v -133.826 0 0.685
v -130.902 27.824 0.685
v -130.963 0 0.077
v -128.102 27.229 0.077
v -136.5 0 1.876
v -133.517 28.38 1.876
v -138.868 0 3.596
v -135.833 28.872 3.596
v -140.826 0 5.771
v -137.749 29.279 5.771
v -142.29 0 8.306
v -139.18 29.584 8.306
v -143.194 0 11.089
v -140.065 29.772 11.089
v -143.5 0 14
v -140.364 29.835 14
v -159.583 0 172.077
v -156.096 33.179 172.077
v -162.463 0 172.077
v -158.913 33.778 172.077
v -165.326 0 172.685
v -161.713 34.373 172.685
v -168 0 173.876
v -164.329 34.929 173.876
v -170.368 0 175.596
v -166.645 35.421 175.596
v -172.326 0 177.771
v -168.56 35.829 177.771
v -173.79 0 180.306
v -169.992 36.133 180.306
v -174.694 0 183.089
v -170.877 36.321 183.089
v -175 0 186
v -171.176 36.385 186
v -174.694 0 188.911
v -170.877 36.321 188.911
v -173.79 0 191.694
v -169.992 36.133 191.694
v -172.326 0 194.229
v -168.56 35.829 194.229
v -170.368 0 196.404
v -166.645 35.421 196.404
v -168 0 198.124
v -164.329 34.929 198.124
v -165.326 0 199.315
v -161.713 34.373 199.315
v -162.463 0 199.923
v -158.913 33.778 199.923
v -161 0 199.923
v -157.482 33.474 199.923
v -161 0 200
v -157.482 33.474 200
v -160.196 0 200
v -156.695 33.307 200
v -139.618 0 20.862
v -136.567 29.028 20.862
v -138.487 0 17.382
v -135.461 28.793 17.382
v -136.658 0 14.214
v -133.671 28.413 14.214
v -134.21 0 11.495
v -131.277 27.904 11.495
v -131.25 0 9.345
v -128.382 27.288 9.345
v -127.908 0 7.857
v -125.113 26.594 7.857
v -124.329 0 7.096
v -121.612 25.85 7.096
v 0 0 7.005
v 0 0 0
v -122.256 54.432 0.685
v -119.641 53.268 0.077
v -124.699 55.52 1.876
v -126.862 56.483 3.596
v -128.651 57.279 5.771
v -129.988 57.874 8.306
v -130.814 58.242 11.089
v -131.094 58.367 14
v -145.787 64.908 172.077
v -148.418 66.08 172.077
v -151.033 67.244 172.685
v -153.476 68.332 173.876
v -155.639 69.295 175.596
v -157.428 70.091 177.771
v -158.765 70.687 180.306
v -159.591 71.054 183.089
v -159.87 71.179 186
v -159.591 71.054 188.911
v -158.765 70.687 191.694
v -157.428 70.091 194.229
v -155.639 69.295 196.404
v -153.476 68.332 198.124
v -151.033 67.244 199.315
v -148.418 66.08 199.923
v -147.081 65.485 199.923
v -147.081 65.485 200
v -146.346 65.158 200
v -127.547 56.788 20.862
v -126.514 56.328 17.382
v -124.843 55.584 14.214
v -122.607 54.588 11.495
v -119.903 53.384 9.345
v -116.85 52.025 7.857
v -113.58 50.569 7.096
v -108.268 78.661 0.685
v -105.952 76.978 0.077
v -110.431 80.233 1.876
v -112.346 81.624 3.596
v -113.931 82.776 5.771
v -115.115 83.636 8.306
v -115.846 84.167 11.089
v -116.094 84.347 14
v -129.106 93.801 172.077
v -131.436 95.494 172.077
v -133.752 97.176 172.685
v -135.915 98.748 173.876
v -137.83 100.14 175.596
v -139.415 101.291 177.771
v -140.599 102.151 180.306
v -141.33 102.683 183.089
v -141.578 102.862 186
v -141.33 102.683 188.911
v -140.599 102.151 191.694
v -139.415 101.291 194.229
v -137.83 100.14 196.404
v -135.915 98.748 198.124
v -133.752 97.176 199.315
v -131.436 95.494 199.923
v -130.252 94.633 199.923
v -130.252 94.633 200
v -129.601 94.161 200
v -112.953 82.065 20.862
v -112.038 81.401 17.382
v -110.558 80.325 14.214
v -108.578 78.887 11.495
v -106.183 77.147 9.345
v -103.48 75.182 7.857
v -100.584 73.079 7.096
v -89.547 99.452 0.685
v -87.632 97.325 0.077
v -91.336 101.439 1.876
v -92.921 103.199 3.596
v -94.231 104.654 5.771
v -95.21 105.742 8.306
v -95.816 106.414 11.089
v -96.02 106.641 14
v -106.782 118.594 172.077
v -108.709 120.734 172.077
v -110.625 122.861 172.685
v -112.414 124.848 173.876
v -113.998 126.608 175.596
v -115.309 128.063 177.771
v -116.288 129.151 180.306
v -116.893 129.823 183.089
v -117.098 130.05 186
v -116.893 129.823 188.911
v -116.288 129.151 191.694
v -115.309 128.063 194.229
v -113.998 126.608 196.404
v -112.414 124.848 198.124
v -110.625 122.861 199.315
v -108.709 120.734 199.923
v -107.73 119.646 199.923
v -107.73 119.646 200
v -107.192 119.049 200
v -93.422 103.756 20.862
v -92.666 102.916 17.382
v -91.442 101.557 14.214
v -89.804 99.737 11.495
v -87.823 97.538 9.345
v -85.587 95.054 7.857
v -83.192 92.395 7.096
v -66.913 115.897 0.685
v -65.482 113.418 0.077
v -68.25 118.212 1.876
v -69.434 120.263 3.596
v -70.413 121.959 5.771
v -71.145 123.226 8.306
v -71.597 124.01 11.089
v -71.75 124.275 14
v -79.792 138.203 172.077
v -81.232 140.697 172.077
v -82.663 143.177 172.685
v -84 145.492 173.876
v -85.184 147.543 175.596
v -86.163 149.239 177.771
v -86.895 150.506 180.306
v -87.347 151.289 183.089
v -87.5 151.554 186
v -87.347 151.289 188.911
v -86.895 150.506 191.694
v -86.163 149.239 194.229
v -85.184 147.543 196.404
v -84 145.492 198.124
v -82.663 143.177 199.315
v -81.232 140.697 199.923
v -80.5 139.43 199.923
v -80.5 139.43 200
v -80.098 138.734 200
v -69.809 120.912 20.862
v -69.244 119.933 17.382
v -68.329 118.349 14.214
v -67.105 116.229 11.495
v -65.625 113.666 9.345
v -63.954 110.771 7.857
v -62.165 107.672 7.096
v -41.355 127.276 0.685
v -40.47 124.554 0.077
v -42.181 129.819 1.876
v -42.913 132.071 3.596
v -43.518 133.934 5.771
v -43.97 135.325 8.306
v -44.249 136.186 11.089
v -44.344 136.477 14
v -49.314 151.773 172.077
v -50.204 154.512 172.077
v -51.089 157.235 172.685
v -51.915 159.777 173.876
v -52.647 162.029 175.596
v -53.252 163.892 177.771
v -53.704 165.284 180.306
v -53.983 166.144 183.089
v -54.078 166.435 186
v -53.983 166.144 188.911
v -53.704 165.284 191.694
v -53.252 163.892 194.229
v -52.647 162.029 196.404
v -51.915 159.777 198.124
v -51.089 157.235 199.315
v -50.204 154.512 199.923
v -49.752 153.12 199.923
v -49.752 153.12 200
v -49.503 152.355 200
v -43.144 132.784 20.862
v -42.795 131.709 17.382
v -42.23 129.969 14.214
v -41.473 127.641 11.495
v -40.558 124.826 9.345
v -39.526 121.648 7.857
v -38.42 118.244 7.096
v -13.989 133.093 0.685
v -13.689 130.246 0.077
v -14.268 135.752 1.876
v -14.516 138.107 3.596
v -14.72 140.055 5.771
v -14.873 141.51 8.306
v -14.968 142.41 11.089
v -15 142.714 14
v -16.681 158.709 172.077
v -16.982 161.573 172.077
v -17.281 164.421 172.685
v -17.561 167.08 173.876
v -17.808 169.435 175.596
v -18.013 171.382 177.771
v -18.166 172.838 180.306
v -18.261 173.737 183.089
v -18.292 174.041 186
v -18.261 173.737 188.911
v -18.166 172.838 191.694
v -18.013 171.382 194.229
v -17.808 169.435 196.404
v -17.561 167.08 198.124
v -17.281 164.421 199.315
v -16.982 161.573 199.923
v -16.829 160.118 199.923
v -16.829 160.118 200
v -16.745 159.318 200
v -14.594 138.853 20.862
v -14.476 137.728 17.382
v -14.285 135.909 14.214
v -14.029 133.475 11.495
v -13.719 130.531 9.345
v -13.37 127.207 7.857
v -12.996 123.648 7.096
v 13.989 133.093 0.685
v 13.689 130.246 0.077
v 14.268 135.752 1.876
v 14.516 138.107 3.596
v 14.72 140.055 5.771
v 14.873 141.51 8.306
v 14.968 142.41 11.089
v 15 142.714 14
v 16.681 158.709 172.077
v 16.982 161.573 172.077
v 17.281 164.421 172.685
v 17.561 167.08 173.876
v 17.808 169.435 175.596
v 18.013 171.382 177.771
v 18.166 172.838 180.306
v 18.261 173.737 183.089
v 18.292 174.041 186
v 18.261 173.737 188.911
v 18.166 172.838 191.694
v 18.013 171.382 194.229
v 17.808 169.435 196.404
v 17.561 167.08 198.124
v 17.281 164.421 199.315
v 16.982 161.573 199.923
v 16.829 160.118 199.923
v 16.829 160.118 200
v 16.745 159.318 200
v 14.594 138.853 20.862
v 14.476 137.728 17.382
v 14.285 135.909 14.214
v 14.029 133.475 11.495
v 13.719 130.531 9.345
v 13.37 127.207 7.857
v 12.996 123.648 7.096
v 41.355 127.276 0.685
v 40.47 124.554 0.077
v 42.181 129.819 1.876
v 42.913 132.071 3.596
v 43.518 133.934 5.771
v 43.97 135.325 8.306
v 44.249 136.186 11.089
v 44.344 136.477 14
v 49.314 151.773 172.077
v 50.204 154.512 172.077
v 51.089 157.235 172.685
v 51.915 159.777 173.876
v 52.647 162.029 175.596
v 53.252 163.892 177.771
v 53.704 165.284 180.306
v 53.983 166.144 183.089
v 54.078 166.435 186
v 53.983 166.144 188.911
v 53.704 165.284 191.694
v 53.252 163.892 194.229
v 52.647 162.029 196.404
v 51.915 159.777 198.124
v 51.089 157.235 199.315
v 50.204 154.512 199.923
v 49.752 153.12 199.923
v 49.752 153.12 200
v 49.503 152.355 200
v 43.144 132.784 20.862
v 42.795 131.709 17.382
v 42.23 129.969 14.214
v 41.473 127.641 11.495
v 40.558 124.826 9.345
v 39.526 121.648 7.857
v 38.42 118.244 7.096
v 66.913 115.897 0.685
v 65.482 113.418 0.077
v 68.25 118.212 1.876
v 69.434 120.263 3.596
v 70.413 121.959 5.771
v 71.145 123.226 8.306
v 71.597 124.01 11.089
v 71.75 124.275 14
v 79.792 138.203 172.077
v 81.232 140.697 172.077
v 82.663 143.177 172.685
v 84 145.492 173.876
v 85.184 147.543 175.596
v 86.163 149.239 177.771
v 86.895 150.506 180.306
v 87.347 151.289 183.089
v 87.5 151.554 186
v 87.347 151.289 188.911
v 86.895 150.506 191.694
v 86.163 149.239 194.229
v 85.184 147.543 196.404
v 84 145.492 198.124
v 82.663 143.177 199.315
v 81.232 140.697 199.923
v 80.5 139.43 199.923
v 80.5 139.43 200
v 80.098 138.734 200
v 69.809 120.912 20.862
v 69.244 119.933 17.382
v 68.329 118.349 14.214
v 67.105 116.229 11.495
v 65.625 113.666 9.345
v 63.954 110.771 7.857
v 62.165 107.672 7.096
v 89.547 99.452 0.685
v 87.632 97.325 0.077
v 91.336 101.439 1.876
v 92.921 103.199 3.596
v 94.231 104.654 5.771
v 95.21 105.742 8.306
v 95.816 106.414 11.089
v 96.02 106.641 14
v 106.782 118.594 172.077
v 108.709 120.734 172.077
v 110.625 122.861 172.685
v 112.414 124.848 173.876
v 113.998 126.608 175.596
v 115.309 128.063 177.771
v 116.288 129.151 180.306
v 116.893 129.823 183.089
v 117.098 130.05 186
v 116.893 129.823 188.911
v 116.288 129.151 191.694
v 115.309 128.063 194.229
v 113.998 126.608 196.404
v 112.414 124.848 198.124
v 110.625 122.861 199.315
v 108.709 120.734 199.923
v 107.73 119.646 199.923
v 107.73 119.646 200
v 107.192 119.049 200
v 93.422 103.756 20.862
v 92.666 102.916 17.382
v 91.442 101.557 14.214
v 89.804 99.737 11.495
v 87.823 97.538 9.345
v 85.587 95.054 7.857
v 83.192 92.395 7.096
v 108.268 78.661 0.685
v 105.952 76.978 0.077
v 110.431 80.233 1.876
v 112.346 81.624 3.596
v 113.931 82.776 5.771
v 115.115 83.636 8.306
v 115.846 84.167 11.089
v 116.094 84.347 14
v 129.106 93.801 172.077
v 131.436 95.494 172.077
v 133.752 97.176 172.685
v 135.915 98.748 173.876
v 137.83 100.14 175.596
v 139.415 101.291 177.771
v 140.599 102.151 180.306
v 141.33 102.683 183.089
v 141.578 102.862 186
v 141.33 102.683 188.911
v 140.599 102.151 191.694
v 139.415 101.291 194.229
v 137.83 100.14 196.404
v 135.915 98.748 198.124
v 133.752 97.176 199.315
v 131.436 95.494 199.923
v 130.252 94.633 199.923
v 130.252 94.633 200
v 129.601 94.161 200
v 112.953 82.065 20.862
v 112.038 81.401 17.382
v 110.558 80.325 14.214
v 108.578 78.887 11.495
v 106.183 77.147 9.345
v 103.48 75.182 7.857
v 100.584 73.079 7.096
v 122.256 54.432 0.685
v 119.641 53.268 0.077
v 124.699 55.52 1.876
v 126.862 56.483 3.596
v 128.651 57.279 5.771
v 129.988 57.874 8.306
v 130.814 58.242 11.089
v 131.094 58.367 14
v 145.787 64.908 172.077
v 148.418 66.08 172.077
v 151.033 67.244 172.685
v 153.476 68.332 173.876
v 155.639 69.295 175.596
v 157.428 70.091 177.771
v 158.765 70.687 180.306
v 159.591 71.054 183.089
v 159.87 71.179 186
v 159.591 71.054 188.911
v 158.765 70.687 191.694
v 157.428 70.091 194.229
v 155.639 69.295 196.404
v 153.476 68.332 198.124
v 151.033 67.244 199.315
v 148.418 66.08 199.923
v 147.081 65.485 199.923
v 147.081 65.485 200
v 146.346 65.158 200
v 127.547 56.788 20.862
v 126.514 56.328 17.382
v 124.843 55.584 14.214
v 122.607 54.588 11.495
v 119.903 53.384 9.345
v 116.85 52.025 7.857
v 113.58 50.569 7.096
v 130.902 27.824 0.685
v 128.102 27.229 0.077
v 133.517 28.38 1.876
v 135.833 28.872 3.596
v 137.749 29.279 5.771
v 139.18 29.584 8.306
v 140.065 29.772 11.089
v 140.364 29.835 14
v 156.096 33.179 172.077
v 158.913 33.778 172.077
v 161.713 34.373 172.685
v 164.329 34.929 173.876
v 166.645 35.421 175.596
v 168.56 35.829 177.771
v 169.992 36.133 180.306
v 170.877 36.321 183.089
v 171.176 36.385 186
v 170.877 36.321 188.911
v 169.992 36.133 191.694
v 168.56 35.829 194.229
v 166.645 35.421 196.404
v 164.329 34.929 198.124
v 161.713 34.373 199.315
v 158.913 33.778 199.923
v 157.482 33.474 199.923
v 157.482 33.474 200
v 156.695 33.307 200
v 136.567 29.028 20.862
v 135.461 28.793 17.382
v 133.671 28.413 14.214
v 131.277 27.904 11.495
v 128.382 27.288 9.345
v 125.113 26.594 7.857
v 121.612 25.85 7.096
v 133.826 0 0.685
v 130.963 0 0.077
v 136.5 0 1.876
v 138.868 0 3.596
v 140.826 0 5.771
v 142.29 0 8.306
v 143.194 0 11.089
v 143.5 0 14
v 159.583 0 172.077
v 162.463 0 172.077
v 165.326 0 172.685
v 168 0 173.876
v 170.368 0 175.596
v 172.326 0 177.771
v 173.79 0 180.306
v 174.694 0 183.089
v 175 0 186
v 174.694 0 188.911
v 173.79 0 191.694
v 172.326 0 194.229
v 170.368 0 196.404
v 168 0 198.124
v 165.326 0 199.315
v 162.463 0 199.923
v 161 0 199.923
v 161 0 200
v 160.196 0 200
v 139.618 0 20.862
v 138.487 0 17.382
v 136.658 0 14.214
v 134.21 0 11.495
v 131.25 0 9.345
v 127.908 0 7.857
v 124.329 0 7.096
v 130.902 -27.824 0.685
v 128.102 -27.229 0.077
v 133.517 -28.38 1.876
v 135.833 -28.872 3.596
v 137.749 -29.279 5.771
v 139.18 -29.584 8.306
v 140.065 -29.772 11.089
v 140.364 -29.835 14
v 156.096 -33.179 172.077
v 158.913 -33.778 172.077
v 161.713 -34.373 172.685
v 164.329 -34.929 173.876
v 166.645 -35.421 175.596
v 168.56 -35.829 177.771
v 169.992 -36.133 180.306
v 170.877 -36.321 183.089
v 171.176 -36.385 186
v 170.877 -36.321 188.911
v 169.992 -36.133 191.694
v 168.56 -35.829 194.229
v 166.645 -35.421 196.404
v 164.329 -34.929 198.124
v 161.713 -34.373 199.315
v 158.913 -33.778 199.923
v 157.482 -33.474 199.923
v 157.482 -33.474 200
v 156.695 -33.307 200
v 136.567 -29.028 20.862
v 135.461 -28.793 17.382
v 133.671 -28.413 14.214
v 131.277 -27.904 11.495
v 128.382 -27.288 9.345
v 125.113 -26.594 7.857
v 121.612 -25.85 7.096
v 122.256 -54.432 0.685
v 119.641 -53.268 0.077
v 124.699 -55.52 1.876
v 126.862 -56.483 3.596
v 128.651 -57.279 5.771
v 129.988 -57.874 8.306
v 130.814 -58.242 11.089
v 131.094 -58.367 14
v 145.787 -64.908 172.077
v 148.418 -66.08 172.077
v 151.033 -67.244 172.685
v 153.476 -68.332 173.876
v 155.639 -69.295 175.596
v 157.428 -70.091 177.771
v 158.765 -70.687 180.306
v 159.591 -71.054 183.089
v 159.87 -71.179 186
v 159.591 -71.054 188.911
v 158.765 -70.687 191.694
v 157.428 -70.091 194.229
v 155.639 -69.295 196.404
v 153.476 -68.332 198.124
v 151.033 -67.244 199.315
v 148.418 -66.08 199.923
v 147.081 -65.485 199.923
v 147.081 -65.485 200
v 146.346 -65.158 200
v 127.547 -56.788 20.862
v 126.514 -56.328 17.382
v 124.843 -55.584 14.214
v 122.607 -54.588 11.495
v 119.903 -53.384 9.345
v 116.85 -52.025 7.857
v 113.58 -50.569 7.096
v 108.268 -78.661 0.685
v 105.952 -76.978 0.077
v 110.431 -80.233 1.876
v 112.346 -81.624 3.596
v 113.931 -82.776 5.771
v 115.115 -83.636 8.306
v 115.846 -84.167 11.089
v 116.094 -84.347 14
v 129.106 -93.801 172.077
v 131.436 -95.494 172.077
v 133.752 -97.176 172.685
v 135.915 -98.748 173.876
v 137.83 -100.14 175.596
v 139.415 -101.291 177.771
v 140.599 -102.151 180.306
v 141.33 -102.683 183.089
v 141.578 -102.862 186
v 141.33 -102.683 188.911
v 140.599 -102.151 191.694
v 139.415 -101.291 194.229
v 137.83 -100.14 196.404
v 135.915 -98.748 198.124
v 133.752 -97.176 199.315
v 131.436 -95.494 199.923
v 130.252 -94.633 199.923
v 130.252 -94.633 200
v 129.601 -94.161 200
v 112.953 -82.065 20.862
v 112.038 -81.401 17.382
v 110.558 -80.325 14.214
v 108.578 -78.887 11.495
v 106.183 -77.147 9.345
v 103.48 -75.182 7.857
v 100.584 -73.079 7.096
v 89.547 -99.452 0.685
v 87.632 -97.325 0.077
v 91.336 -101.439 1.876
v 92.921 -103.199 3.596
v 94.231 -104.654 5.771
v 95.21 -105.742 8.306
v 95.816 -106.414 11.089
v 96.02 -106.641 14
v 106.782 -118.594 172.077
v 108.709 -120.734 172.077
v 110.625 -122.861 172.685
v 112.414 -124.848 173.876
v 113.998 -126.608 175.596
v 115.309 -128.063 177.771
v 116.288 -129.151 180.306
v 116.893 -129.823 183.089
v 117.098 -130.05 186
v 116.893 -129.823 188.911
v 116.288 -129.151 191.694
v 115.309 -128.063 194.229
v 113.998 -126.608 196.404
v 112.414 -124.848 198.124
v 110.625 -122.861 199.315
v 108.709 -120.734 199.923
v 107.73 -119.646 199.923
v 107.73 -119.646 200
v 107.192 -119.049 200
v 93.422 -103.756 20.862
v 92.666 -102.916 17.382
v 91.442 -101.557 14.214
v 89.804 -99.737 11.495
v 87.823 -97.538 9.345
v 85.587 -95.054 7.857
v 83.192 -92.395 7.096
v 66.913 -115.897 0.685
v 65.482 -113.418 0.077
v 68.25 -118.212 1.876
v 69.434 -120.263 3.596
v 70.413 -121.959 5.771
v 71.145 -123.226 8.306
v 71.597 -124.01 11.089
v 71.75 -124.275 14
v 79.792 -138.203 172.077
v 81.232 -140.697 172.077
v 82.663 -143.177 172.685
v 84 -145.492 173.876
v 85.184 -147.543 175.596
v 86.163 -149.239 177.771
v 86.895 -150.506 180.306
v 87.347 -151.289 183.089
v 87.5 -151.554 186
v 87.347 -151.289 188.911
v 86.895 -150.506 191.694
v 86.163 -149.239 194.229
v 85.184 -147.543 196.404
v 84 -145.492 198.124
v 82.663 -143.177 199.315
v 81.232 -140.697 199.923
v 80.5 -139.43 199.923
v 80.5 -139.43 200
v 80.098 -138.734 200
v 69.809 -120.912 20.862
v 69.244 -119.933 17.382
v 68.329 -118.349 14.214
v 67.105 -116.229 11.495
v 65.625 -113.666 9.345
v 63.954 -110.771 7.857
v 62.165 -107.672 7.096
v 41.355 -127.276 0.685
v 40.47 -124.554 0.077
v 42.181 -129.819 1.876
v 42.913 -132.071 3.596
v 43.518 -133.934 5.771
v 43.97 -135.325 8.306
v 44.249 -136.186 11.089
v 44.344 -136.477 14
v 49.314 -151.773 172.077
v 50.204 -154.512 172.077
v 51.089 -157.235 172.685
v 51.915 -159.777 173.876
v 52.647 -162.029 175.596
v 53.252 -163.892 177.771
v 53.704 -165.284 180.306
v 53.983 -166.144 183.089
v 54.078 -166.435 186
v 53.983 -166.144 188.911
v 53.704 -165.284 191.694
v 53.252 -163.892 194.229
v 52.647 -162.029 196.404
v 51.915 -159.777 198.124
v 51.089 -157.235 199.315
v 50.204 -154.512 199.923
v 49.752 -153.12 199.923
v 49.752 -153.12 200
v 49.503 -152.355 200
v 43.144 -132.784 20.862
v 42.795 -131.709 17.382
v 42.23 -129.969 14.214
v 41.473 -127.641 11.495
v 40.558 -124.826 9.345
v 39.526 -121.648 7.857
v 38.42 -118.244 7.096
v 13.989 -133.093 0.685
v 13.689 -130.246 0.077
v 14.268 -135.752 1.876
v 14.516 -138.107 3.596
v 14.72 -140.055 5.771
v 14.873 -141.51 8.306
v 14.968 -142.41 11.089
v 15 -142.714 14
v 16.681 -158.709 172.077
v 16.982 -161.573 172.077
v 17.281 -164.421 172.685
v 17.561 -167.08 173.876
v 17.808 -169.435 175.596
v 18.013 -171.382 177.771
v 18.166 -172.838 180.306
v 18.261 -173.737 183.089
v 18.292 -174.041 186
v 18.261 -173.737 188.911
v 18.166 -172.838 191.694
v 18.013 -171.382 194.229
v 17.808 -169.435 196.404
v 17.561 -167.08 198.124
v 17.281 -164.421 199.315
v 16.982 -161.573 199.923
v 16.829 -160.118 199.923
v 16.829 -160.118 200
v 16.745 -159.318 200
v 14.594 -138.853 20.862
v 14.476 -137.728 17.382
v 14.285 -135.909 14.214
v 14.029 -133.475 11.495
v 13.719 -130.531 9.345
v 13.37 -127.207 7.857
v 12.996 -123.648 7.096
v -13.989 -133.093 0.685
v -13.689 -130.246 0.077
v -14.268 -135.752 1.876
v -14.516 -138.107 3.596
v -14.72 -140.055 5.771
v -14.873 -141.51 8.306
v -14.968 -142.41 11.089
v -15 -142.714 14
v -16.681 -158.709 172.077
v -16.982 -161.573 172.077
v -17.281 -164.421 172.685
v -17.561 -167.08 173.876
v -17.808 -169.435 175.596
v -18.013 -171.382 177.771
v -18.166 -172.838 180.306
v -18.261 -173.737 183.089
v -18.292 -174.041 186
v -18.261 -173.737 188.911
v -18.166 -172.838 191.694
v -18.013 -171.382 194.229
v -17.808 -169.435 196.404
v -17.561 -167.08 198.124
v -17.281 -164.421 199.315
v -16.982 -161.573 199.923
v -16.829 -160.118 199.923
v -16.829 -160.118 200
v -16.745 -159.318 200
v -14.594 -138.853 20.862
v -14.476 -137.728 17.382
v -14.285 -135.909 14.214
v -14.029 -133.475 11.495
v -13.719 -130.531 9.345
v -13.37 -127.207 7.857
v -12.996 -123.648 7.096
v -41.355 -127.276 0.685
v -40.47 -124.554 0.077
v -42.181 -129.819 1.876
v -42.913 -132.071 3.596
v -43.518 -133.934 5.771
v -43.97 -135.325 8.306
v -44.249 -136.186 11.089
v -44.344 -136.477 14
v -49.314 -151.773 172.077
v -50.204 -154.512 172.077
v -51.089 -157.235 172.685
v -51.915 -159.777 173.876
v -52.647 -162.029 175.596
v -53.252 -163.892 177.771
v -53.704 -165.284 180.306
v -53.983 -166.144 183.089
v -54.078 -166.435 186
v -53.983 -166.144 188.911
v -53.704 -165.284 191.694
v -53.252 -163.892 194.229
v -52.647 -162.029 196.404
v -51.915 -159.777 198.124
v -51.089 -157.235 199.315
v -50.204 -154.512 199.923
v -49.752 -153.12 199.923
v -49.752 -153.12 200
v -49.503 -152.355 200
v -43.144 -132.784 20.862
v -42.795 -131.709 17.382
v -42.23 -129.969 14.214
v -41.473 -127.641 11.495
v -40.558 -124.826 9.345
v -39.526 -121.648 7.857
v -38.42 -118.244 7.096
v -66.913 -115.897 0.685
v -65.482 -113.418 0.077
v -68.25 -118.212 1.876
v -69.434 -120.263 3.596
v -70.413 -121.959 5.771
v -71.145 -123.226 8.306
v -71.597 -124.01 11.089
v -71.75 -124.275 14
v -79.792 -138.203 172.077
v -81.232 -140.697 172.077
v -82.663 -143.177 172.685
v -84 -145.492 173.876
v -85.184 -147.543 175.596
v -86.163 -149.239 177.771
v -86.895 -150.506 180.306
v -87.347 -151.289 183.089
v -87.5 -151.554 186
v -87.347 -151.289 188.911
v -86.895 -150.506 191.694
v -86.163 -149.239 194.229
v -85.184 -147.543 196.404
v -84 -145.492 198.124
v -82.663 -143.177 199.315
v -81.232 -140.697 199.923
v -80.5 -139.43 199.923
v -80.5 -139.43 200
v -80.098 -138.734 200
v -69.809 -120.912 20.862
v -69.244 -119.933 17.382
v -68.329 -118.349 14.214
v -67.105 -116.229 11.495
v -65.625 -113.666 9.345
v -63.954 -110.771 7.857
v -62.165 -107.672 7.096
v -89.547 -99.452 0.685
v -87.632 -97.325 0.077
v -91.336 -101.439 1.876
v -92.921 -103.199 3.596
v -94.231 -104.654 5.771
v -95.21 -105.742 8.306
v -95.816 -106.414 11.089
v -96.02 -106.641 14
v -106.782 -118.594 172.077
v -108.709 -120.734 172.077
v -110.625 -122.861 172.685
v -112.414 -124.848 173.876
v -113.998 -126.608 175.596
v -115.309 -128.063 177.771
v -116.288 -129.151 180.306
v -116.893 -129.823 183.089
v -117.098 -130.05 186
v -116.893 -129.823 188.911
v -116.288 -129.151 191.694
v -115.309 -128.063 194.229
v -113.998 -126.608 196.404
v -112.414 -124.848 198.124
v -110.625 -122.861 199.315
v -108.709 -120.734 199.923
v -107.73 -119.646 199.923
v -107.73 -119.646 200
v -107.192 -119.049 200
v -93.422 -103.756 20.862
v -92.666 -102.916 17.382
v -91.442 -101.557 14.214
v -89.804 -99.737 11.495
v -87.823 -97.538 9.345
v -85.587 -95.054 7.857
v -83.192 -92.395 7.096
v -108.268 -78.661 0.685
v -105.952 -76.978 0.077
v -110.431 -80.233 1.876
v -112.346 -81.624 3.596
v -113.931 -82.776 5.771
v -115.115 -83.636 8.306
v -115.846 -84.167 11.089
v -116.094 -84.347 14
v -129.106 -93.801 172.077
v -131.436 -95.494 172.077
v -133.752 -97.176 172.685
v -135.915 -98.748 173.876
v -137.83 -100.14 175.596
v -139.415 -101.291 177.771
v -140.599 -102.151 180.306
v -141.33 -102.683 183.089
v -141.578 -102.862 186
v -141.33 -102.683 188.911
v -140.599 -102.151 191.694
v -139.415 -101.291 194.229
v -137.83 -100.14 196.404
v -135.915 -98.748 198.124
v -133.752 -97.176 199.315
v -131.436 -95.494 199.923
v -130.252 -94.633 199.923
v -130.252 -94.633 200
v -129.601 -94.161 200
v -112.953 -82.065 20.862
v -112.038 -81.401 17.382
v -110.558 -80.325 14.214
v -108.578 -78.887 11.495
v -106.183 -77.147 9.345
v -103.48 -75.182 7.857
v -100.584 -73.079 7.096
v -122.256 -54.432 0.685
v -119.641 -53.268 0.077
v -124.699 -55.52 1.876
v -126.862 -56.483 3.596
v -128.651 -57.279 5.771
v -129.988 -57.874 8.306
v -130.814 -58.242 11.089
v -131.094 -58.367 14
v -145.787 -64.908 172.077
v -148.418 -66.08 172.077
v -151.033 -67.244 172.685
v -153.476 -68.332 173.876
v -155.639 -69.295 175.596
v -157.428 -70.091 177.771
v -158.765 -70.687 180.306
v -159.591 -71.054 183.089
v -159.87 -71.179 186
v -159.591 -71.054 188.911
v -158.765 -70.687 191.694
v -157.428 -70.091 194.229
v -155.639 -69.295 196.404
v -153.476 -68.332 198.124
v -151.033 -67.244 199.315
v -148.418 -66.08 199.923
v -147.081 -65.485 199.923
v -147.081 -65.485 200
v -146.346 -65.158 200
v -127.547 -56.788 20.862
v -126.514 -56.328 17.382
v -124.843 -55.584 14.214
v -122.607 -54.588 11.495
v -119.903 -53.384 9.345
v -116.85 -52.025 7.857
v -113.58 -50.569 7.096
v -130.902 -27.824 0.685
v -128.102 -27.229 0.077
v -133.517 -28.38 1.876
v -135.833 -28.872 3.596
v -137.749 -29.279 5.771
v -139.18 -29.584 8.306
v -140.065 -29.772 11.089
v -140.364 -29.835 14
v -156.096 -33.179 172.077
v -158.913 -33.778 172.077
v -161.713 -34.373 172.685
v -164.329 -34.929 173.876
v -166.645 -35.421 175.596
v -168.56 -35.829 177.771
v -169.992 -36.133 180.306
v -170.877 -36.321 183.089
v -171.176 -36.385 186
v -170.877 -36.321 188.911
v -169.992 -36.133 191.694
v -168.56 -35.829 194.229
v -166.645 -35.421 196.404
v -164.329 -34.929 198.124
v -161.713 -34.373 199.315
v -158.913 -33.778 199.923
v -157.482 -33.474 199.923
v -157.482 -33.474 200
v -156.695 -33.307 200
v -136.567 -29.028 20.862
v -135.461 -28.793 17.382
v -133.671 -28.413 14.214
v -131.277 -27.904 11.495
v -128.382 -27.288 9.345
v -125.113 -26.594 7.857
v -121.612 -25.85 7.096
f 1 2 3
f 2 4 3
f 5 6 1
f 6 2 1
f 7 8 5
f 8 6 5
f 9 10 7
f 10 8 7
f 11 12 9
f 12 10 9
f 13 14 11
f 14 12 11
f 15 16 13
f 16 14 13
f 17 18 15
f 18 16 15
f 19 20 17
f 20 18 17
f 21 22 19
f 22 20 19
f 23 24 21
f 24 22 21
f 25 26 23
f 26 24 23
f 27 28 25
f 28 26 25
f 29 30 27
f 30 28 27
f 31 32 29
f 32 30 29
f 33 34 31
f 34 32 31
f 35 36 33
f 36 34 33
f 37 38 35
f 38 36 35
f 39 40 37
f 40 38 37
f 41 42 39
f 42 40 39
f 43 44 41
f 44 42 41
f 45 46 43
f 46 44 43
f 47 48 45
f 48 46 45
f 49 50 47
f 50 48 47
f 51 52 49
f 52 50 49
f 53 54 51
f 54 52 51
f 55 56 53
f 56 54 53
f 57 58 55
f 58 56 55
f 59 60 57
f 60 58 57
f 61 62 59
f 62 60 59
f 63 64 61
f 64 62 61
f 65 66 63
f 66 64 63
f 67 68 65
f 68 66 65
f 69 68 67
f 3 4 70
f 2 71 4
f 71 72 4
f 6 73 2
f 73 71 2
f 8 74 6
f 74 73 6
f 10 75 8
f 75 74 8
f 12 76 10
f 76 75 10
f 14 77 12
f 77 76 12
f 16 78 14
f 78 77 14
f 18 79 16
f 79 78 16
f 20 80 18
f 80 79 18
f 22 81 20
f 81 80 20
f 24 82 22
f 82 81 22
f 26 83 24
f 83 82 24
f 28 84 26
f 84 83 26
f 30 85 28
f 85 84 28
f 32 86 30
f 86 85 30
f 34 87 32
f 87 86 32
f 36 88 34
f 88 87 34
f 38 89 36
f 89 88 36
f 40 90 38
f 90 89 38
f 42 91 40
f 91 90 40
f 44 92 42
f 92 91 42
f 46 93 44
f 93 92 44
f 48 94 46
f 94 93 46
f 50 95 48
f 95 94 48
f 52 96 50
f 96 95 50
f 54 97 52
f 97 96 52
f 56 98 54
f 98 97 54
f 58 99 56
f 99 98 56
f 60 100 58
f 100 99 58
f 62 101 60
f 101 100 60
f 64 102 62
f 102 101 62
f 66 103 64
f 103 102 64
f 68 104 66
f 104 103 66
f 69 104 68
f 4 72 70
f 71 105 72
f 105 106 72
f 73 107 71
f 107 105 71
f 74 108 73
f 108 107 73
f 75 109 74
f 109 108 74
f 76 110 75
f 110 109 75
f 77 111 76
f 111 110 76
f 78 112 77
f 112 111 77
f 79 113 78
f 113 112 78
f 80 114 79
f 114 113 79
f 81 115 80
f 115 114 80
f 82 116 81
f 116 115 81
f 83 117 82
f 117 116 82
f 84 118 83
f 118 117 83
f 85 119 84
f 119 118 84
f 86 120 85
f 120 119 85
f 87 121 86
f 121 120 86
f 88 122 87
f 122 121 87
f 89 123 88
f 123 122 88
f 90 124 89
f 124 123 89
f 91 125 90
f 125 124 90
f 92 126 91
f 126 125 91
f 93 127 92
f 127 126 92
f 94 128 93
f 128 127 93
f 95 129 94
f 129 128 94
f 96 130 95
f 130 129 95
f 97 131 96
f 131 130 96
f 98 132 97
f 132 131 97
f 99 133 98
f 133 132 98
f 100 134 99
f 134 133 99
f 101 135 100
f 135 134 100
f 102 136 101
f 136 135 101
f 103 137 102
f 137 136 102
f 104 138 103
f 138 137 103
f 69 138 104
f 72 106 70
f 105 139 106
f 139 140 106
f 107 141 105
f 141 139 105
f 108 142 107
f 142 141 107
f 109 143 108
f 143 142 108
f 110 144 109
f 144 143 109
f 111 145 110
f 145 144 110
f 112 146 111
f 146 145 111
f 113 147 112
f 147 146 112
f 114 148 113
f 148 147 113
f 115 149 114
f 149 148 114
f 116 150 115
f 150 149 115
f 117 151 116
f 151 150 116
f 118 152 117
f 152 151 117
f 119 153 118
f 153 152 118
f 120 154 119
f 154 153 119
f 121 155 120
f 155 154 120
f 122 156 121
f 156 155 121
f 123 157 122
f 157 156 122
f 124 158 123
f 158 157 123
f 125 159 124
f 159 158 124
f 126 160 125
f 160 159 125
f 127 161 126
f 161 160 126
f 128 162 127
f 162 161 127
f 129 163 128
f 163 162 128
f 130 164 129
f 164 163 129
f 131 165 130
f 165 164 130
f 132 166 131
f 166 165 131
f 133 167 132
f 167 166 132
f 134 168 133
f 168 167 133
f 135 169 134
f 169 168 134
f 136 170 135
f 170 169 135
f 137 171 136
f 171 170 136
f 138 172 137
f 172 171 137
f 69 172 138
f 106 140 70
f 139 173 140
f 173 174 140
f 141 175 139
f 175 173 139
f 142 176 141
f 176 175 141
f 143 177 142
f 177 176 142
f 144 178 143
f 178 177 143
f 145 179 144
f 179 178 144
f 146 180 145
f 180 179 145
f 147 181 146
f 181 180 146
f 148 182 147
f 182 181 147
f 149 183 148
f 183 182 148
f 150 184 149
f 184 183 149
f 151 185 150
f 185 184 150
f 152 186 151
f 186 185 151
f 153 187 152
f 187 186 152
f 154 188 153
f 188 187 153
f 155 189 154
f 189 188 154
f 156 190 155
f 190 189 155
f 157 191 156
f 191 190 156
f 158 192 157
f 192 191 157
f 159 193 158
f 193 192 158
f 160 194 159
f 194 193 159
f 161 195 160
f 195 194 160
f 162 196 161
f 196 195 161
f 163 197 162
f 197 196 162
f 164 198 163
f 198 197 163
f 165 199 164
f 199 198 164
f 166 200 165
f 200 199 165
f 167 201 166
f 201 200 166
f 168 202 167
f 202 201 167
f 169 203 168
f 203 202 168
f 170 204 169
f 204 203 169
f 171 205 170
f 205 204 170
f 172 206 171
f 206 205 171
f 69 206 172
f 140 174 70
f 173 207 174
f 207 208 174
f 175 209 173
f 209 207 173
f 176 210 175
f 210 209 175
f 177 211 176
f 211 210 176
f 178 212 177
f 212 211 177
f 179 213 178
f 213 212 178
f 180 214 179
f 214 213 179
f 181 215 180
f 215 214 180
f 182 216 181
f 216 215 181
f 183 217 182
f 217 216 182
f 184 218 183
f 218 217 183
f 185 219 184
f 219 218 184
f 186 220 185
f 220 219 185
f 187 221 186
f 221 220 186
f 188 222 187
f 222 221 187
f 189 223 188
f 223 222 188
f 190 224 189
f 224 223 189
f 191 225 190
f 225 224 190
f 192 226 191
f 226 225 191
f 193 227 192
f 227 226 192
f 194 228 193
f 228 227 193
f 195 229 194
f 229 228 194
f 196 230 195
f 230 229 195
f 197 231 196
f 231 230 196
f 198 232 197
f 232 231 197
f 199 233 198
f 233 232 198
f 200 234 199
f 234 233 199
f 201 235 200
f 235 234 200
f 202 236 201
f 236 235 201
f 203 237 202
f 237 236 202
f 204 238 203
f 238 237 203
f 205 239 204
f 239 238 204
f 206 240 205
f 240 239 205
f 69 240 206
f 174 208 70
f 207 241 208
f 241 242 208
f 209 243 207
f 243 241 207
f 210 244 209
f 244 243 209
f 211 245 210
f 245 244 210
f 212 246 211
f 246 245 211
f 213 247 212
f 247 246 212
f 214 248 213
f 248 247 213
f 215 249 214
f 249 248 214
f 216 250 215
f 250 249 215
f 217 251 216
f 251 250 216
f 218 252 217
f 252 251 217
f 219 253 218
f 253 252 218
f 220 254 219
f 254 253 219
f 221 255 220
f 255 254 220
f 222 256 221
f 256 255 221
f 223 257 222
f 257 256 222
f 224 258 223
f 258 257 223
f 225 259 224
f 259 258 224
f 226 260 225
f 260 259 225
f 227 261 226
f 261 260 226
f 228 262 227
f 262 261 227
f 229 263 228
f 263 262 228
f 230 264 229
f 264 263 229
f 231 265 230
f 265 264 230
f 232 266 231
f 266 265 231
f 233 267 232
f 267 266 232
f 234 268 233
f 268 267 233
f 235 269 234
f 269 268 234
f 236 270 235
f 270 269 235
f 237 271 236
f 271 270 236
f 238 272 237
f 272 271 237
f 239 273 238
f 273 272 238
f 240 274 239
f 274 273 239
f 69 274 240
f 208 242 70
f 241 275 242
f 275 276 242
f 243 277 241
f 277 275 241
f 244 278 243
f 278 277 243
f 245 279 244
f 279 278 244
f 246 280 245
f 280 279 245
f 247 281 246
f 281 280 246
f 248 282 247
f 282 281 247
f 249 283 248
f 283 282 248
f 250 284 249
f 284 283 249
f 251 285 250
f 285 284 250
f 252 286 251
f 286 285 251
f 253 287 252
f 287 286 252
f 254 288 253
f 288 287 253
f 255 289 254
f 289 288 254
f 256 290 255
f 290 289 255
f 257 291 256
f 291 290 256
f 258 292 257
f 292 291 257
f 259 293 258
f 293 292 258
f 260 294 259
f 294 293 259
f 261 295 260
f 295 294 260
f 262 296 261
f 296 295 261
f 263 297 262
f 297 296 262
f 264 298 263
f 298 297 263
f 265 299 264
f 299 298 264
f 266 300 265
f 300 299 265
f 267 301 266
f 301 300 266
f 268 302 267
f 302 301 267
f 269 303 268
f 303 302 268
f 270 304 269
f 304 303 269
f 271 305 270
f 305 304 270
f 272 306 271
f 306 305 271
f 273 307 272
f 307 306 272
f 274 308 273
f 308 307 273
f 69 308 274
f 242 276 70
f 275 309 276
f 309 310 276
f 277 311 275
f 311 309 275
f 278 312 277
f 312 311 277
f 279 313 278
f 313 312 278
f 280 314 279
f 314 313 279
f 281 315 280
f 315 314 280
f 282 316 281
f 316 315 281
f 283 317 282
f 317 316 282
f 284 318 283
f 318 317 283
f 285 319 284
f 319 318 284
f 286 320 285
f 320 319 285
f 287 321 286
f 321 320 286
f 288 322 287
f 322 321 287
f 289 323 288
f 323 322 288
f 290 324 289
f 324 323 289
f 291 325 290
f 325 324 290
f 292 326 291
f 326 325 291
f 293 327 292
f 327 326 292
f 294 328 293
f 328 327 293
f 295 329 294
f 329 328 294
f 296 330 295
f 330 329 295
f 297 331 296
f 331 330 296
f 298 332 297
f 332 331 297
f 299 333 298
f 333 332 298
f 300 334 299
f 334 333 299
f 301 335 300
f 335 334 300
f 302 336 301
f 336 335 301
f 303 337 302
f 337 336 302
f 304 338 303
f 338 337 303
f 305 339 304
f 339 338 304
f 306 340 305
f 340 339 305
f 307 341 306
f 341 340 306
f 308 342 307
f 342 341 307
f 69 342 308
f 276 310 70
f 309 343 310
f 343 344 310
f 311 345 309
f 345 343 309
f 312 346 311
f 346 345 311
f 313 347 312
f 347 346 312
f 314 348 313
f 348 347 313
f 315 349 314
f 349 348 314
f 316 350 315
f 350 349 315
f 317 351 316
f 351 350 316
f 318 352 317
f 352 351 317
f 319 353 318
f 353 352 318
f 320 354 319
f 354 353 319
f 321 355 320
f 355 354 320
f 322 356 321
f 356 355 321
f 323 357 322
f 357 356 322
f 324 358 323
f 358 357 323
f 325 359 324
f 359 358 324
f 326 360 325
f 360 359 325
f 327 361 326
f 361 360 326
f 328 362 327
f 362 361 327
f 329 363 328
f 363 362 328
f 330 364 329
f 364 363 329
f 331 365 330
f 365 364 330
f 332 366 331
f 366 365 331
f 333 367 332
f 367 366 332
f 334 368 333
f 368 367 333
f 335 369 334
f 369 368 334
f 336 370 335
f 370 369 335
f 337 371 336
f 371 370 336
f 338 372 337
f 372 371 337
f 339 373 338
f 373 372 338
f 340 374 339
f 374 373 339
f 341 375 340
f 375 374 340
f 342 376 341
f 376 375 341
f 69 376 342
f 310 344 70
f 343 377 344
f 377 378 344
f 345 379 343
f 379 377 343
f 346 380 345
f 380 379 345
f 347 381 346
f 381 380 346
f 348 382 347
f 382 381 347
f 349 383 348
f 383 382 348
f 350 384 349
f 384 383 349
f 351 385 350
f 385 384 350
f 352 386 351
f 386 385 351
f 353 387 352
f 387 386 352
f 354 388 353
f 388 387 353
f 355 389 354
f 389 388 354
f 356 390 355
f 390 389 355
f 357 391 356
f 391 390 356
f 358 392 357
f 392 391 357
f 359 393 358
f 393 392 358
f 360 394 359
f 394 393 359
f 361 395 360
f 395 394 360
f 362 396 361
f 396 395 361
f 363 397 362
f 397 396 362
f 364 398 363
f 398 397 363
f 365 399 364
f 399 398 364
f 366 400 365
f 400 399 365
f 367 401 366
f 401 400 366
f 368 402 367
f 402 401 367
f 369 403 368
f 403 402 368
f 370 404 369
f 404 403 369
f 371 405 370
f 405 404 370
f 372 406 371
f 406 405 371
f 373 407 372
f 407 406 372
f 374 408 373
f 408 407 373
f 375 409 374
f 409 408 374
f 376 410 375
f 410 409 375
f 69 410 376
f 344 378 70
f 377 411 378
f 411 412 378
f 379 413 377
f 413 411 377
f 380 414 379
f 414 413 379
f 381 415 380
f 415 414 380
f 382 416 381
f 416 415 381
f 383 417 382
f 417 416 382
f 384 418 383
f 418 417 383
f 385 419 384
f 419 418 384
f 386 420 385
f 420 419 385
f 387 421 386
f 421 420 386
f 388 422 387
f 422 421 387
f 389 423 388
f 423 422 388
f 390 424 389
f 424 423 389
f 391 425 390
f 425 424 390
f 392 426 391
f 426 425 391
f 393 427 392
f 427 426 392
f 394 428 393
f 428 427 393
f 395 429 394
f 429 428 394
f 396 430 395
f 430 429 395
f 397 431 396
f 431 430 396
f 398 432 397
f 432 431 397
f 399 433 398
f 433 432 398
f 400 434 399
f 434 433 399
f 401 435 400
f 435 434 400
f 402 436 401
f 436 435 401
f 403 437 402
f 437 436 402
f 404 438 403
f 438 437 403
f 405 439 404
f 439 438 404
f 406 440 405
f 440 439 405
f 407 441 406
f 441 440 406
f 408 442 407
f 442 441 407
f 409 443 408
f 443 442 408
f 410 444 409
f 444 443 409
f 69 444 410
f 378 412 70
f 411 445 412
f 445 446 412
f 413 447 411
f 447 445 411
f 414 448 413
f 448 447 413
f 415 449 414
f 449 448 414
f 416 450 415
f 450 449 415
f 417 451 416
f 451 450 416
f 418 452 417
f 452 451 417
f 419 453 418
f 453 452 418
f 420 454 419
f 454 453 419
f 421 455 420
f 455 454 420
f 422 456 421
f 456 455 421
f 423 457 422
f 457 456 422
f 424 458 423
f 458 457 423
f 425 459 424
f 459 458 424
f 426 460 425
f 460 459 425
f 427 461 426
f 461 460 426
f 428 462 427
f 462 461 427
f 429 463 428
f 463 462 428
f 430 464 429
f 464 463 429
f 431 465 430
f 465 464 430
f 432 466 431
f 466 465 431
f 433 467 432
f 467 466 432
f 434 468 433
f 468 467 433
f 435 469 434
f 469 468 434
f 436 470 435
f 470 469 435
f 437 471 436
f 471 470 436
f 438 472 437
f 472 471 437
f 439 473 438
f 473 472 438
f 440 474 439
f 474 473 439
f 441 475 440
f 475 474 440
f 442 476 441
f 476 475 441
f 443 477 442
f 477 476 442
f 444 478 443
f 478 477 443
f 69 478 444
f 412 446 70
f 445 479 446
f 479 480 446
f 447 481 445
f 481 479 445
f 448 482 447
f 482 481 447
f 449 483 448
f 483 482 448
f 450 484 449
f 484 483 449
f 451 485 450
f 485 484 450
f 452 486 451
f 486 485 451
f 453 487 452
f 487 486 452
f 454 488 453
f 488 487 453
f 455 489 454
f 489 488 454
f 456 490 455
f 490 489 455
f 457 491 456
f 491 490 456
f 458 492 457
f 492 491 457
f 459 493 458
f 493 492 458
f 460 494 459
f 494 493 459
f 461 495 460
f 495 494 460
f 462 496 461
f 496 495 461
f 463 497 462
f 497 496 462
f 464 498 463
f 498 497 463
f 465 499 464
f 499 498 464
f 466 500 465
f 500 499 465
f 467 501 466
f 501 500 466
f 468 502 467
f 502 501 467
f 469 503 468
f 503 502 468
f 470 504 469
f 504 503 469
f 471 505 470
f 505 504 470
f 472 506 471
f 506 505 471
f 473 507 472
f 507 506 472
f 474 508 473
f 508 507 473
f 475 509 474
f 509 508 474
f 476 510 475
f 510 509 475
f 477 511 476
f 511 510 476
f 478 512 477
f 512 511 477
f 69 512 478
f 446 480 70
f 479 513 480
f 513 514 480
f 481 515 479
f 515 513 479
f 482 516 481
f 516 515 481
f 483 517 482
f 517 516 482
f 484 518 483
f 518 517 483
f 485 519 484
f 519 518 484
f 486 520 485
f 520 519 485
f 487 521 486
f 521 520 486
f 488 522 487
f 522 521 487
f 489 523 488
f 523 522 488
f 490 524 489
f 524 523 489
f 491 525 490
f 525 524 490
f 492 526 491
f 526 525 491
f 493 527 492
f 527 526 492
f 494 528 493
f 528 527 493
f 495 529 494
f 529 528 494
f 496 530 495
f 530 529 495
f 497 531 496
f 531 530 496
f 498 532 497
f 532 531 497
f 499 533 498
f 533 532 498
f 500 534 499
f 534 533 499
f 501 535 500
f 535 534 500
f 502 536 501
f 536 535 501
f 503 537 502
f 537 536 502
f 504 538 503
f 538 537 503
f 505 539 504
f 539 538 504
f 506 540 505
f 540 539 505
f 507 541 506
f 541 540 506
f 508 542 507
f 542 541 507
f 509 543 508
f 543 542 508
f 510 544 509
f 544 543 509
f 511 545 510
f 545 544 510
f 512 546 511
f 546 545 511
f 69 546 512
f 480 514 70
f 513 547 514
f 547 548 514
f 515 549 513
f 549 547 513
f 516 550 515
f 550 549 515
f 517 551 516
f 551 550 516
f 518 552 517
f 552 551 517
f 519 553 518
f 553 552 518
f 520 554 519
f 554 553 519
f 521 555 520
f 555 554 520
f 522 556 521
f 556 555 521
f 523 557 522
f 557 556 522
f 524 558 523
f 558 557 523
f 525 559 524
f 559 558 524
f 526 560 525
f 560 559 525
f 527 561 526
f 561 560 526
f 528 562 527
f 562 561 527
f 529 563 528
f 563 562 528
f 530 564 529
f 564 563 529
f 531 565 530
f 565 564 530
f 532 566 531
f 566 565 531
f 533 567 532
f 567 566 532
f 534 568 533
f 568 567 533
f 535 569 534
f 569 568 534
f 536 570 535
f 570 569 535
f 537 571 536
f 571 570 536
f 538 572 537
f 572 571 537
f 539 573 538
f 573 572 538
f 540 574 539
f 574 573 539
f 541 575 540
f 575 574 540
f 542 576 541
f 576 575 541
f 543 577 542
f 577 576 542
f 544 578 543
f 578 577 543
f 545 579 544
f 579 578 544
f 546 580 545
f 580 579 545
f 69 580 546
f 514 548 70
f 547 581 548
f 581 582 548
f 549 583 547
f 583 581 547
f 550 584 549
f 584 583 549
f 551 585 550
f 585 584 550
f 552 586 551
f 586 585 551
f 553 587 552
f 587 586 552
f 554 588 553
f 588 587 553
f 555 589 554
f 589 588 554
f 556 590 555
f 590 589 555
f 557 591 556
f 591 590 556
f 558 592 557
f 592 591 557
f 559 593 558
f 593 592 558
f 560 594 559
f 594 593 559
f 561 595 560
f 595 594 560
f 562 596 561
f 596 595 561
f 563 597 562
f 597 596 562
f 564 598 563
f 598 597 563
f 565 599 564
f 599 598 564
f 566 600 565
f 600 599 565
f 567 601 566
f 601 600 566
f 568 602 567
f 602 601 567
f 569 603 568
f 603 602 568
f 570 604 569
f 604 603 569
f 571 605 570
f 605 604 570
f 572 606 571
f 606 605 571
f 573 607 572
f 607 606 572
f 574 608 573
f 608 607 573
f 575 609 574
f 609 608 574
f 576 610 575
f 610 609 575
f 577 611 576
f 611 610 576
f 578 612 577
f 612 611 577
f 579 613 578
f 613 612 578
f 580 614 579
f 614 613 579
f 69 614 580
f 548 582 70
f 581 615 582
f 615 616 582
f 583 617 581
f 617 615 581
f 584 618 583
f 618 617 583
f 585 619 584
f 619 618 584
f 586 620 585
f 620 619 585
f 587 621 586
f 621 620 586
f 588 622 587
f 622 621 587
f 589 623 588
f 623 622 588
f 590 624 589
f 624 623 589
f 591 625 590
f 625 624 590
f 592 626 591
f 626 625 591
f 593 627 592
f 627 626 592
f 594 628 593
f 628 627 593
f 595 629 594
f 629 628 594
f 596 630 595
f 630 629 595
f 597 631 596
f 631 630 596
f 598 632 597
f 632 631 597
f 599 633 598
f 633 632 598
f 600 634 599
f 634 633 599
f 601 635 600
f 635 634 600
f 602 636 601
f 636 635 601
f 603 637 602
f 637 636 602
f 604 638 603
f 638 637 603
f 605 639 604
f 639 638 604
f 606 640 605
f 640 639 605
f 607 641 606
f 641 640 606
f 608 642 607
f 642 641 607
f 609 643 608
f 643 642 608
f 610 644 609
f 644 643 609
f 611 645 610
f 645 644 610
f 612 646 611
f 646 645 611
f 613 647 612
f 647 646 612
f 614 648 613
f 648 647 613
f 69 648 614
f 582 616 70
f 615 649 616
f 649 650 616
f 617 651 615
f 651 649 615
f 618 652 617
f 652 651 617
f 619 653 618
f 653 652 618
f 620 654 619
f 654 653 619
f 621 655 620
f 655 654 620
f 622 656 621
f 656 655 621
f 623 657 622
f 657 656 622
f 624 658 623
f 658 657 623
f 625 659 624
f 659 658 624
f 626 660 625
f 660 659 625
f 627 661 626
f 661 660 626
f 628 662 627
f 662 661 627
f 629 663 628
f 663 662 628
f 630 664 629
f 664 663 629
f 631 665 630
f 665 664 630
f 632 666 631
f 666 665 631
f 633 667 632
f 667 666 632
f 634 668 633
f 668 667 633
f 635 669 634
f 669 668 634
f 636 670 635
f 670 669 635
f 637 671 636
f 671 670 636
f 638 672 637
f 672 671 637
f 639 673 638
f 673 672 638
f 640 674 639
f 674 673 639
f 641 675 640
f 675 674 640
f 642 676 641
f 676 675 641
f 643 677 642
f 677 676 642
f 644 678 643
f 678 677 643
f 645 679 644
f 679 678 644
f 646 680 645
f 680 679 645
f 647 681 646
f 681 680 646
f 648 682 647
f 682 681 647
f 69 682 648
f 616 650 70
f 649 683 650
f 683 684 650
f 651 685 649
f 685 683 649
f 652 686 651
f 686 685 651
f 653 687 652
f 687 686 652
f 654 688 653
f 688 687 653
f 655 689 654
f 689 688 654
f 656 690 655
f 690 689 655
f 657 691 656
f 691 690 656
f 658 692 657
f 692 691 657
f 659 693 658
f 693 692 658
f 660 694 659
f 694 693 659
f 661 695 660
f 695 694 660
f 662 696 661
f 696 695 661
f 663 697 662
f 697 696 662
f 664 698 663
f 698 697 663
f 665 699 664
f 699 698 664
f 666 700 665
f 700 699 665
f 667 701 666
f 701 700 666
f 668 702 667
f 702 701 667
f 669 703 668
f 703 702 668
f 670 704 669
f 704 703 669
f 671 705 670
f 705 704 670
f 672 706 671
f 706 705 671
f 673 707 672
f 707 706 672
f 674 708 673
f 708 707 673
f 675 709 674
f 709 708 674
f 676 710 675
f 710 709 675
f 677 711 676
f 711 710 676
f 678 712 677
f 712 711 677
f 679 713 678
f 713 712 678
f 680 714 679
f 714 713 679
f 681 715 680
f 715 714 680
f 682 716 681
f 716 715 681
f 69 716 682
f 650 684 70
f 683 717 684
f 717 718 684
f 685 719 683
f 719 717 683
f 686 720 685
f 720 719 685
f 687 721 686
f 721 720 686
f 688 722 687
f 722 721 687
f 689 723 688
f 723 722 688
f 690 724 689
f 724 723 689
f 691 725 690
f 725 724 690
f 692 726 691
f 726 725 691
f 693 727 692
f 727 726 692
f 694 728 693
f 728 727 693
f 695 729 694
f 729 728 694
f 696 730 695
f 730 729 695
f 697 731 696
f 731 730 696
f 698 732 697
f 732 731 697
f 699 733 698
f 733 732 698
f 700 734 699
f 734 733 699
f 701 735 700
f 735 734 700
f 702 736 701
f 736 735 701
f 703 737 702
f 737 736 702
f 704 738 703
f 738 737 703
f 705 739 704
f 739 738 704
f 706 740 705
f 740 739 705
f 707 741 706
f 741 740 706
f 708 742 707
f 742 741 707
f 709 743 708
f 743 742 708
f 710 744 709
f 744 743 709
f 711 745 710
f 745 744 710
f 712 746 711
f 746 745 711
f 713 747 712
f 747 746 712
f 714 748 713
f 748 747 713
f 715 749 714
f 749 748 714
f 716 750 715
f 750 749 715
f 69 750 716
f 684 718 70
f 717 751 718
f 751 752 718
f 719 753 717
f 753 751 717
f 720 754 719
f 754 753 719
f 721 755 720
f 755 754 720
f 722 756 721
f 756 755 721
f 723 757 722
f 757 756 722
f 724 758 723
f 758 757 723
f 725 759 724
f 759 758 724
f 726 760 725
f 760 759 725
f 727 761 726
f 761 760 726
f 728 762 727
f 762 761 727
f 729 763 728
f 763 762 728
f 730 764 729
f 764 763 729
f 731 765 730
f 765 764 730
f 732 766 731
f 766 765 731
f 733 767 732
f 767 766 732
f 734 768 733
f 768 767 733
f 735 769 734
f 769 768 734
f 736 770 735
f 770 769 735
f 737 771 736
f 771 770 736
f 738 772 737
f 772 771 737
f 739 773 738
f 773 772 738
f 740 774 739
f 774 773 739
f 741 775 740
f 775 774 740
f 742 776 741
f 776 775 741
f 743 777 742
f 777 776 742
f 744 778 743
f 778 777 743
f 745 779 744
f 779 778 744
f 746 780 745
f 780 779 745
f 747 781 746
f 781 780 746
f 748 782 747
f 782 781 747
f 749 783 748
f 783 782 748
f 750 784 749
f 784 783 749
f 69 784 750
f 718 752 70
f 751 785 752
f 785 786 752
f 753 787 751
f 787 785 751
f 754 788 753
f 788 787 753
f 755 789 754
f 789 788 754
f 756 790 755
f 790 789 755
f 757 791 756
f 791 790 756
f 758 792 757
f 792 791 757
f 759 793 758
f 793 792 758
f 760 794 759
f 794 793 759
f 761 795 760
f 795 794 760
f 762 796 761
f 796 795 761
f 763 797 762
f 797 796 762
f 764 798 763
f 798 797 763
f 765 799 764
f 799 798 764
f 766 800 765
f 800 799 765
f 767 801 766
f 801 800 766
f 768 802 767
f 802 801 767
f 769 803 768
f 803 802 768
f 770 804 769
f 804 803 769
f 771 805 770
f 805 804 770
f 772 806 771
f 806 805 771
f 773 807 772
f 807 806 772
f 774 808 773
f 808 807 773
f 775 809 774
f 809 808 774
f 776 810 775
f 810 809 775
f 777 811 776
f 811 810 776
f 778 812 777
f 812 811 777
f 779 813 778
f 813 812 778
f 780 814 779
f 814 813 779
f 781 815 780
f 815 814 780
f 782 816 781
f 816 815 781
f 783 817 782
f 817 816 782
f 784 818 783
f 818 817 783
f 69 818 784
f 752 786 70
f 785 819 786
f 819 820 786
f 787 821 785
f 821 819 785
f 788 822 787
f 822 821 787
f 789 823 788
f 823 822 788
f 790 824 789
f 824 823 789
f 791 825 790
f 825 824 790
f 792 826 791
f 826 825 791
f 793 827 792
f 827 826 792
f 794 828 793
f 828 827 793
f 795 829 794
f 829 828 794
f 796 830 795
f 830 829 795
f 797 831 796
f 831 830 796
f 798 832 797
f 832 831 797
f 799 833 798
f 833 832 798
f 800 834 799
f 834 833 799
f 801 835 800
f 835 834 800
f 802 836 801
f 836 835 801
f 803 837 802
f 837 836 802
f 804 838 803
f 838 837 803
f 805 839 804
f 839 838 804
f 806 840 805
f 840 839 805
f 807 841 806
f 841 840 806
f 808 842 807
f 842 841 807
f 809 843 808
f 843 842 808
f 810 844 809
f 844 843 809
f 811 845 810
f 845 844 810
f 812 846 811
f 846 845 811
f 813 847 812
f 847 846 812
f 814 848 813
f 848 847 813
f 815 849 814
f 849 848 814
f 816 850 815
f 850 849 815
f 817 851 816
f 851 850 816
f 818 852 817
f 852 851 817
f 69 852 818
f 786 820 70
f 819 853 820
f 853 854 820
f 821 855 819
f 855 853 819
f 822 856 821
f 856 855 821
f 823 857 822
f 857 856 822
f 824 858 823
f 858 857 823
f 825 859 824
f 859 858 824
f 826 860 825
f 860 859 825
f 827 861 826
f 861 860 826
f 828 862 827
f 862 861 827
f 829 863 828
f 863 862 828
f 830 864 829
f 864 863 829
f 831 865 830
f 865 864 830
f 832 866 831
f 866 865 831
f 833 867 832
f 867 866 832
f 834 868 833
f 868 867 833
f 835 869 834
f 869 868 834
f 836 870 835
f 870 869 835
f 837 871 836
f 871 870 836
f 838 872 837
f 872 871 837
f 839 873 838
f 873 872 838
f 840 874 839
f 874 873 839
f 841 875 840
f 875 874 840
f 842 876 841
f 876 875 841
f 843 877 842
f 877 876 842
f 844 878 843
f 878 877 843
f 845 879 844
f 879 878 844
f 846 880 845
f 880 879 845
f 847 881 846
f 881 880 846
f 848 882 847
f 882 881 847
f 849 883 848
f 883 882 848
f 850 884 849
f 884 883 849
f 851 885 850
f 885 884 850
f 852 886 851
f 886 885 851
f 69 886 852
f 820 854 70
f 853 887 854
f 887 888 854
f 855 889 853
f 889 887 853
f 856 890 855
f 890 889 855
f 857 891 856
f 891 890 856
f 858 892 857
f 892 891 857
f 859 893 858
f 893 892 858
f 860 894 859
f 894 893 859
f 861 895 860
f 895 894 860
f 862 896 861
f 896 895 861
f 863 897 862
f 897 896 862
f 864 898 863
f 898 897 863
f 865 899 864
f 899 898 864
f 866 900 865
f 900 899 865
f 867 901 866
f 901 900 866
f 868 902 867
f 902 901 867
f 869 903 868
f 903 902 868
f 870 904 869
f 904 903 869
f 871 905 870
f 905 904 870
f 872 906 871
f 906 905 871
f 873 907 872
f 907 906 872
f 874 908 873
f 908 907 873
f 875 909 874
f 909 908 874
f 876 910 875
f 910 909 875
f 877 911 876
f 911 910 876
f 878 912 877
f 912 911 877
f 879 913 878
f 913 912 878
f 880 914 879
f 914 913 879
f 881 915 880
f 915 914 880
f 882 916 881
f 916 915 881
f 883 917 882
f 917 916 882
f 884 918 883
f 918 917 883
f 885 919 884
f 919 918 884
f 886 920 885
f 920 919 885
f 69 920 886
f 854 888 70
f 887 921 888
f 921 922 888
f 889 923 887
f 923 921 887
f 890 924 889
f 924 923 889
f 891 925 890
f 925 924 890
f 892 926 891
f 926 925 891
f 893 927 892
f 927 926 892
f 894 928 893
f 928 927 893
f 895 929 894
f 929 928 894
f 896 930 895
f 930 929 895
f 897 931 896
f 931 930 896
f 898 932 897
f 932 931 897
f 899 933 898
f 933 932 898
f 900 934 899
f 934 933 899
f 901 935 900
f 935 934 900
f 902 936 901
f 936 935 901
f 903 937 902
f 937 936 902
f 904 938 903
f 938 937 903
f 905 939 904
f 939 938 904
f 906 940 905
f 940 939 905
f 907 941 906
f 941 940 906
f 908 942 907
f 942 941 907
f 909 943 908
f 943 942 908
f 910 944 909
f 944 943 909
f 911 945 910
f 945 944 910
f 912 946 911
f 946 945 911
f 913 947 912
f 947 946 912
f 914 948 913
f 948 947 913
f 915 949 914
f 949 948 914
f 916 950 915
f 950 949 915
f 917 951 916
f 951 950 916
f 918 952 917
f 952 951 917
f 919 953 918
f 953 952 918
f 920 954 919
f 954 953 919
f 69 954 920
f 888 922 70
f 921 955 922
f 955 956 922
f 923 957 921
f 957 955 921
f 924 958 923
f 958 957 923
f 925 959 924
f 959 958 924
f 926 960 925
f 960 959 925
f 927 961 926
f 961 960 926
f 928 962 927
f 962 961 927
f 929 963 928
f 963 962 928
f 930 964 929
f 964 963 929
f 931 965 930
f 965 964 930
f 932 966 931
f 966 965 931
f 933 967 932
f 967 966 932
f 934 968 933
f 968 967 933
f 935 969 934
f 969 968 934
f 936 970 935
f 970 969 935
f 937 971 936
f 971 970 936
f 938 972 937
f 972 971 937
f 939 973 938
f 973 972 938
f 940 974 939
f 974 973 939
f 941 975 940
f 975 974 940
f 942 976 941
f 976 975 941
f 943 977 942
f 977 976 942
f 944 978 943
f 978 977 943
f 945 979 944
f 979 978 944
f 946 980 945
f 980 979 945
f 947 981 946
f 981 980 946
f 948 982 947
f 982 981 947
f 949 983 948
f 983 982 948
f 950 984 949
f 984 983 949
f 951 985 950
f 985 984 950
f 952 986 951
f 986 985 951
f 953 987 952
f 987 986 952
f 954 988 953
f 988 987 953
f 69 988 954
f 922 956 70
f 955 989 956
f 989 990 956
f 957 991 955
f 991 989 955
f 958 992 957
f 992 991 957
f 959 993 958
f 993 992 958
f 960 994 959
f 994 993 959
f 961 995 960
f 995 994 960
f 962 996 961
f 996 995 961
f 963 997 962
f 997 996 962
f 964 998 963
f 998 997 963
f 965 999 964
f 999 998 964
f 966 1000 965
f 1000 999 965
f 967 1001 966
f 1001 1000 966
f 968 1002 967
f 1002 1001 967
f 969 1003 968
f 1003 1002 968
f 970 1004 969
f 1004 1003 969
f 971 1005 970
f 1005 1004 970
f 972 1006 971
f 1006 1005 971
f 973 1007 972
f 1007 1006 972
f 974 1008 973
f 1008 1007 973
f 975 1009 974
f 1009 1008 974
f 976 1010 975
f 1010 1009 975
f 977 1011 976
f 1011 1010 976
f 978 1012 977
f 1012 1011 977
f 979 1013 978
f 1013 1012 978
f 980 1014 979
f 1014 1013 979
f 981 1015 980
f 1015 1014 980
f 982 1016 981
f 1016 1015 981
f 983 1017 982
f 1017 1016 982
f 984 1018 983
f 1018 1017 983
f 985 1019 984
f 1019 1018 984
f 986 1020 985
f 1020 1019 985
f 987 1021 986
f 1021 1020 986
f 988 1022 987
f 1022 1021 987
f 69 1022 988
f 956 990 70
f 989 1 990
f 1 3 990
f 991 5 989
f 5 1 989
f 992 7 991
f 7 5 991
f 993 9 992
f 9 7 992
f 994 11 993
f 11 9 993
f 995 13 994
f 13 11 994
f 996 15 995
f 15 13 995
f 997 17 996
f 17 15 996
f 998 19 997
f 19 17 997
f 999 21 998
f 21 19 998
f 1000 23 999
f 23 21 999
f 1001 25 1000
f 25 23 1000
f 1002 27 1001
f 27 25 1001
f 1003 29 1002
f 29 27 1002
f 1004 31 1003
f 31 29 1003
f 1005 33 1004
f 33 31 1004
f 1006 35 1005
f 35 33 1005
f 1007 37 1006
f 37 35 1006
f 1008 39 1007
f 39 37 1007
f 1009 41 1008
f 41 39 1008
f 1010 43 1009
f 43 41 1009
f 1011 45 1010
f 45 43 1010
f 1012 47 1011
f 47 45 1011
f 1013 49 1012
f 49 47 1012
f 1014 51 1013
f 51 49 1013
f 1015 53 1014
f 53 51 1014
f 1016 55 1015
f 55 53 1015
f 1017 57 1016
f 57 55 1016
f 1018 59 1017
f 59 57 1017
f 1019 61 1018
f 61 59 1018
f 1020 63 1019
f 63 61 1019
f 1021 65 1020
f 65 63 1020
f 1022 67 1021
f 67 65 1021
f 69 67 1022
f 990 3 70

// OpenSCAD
height=200;
diameter=350;

module bucket(d=diameter,h=height) {
    re=d/25; // radius edge
    wt=d/50; // wall thickness
   
    rotate_extrude(convexity=10)


    difference() {


    union()
    {
        translate([d/2-re,h-re]) circle(re);
        hull() {
        translate([0.37*d,re, 0]) circle(re);
        polygon([[0,0],[d/2-re,h-re],[0,h-re]]);
        translate([0,h-re]) square([d/2-re,re]);
    
        }
    }  
     translate([-wt,wt]) 
       hull() {
    translate([0.37*d,d/20, 0]) circle(d/20);
    polygon([[0,0],[(d-re)/2,h],[0,h]]);
    }
  

    }
    
    
}

bucket();
